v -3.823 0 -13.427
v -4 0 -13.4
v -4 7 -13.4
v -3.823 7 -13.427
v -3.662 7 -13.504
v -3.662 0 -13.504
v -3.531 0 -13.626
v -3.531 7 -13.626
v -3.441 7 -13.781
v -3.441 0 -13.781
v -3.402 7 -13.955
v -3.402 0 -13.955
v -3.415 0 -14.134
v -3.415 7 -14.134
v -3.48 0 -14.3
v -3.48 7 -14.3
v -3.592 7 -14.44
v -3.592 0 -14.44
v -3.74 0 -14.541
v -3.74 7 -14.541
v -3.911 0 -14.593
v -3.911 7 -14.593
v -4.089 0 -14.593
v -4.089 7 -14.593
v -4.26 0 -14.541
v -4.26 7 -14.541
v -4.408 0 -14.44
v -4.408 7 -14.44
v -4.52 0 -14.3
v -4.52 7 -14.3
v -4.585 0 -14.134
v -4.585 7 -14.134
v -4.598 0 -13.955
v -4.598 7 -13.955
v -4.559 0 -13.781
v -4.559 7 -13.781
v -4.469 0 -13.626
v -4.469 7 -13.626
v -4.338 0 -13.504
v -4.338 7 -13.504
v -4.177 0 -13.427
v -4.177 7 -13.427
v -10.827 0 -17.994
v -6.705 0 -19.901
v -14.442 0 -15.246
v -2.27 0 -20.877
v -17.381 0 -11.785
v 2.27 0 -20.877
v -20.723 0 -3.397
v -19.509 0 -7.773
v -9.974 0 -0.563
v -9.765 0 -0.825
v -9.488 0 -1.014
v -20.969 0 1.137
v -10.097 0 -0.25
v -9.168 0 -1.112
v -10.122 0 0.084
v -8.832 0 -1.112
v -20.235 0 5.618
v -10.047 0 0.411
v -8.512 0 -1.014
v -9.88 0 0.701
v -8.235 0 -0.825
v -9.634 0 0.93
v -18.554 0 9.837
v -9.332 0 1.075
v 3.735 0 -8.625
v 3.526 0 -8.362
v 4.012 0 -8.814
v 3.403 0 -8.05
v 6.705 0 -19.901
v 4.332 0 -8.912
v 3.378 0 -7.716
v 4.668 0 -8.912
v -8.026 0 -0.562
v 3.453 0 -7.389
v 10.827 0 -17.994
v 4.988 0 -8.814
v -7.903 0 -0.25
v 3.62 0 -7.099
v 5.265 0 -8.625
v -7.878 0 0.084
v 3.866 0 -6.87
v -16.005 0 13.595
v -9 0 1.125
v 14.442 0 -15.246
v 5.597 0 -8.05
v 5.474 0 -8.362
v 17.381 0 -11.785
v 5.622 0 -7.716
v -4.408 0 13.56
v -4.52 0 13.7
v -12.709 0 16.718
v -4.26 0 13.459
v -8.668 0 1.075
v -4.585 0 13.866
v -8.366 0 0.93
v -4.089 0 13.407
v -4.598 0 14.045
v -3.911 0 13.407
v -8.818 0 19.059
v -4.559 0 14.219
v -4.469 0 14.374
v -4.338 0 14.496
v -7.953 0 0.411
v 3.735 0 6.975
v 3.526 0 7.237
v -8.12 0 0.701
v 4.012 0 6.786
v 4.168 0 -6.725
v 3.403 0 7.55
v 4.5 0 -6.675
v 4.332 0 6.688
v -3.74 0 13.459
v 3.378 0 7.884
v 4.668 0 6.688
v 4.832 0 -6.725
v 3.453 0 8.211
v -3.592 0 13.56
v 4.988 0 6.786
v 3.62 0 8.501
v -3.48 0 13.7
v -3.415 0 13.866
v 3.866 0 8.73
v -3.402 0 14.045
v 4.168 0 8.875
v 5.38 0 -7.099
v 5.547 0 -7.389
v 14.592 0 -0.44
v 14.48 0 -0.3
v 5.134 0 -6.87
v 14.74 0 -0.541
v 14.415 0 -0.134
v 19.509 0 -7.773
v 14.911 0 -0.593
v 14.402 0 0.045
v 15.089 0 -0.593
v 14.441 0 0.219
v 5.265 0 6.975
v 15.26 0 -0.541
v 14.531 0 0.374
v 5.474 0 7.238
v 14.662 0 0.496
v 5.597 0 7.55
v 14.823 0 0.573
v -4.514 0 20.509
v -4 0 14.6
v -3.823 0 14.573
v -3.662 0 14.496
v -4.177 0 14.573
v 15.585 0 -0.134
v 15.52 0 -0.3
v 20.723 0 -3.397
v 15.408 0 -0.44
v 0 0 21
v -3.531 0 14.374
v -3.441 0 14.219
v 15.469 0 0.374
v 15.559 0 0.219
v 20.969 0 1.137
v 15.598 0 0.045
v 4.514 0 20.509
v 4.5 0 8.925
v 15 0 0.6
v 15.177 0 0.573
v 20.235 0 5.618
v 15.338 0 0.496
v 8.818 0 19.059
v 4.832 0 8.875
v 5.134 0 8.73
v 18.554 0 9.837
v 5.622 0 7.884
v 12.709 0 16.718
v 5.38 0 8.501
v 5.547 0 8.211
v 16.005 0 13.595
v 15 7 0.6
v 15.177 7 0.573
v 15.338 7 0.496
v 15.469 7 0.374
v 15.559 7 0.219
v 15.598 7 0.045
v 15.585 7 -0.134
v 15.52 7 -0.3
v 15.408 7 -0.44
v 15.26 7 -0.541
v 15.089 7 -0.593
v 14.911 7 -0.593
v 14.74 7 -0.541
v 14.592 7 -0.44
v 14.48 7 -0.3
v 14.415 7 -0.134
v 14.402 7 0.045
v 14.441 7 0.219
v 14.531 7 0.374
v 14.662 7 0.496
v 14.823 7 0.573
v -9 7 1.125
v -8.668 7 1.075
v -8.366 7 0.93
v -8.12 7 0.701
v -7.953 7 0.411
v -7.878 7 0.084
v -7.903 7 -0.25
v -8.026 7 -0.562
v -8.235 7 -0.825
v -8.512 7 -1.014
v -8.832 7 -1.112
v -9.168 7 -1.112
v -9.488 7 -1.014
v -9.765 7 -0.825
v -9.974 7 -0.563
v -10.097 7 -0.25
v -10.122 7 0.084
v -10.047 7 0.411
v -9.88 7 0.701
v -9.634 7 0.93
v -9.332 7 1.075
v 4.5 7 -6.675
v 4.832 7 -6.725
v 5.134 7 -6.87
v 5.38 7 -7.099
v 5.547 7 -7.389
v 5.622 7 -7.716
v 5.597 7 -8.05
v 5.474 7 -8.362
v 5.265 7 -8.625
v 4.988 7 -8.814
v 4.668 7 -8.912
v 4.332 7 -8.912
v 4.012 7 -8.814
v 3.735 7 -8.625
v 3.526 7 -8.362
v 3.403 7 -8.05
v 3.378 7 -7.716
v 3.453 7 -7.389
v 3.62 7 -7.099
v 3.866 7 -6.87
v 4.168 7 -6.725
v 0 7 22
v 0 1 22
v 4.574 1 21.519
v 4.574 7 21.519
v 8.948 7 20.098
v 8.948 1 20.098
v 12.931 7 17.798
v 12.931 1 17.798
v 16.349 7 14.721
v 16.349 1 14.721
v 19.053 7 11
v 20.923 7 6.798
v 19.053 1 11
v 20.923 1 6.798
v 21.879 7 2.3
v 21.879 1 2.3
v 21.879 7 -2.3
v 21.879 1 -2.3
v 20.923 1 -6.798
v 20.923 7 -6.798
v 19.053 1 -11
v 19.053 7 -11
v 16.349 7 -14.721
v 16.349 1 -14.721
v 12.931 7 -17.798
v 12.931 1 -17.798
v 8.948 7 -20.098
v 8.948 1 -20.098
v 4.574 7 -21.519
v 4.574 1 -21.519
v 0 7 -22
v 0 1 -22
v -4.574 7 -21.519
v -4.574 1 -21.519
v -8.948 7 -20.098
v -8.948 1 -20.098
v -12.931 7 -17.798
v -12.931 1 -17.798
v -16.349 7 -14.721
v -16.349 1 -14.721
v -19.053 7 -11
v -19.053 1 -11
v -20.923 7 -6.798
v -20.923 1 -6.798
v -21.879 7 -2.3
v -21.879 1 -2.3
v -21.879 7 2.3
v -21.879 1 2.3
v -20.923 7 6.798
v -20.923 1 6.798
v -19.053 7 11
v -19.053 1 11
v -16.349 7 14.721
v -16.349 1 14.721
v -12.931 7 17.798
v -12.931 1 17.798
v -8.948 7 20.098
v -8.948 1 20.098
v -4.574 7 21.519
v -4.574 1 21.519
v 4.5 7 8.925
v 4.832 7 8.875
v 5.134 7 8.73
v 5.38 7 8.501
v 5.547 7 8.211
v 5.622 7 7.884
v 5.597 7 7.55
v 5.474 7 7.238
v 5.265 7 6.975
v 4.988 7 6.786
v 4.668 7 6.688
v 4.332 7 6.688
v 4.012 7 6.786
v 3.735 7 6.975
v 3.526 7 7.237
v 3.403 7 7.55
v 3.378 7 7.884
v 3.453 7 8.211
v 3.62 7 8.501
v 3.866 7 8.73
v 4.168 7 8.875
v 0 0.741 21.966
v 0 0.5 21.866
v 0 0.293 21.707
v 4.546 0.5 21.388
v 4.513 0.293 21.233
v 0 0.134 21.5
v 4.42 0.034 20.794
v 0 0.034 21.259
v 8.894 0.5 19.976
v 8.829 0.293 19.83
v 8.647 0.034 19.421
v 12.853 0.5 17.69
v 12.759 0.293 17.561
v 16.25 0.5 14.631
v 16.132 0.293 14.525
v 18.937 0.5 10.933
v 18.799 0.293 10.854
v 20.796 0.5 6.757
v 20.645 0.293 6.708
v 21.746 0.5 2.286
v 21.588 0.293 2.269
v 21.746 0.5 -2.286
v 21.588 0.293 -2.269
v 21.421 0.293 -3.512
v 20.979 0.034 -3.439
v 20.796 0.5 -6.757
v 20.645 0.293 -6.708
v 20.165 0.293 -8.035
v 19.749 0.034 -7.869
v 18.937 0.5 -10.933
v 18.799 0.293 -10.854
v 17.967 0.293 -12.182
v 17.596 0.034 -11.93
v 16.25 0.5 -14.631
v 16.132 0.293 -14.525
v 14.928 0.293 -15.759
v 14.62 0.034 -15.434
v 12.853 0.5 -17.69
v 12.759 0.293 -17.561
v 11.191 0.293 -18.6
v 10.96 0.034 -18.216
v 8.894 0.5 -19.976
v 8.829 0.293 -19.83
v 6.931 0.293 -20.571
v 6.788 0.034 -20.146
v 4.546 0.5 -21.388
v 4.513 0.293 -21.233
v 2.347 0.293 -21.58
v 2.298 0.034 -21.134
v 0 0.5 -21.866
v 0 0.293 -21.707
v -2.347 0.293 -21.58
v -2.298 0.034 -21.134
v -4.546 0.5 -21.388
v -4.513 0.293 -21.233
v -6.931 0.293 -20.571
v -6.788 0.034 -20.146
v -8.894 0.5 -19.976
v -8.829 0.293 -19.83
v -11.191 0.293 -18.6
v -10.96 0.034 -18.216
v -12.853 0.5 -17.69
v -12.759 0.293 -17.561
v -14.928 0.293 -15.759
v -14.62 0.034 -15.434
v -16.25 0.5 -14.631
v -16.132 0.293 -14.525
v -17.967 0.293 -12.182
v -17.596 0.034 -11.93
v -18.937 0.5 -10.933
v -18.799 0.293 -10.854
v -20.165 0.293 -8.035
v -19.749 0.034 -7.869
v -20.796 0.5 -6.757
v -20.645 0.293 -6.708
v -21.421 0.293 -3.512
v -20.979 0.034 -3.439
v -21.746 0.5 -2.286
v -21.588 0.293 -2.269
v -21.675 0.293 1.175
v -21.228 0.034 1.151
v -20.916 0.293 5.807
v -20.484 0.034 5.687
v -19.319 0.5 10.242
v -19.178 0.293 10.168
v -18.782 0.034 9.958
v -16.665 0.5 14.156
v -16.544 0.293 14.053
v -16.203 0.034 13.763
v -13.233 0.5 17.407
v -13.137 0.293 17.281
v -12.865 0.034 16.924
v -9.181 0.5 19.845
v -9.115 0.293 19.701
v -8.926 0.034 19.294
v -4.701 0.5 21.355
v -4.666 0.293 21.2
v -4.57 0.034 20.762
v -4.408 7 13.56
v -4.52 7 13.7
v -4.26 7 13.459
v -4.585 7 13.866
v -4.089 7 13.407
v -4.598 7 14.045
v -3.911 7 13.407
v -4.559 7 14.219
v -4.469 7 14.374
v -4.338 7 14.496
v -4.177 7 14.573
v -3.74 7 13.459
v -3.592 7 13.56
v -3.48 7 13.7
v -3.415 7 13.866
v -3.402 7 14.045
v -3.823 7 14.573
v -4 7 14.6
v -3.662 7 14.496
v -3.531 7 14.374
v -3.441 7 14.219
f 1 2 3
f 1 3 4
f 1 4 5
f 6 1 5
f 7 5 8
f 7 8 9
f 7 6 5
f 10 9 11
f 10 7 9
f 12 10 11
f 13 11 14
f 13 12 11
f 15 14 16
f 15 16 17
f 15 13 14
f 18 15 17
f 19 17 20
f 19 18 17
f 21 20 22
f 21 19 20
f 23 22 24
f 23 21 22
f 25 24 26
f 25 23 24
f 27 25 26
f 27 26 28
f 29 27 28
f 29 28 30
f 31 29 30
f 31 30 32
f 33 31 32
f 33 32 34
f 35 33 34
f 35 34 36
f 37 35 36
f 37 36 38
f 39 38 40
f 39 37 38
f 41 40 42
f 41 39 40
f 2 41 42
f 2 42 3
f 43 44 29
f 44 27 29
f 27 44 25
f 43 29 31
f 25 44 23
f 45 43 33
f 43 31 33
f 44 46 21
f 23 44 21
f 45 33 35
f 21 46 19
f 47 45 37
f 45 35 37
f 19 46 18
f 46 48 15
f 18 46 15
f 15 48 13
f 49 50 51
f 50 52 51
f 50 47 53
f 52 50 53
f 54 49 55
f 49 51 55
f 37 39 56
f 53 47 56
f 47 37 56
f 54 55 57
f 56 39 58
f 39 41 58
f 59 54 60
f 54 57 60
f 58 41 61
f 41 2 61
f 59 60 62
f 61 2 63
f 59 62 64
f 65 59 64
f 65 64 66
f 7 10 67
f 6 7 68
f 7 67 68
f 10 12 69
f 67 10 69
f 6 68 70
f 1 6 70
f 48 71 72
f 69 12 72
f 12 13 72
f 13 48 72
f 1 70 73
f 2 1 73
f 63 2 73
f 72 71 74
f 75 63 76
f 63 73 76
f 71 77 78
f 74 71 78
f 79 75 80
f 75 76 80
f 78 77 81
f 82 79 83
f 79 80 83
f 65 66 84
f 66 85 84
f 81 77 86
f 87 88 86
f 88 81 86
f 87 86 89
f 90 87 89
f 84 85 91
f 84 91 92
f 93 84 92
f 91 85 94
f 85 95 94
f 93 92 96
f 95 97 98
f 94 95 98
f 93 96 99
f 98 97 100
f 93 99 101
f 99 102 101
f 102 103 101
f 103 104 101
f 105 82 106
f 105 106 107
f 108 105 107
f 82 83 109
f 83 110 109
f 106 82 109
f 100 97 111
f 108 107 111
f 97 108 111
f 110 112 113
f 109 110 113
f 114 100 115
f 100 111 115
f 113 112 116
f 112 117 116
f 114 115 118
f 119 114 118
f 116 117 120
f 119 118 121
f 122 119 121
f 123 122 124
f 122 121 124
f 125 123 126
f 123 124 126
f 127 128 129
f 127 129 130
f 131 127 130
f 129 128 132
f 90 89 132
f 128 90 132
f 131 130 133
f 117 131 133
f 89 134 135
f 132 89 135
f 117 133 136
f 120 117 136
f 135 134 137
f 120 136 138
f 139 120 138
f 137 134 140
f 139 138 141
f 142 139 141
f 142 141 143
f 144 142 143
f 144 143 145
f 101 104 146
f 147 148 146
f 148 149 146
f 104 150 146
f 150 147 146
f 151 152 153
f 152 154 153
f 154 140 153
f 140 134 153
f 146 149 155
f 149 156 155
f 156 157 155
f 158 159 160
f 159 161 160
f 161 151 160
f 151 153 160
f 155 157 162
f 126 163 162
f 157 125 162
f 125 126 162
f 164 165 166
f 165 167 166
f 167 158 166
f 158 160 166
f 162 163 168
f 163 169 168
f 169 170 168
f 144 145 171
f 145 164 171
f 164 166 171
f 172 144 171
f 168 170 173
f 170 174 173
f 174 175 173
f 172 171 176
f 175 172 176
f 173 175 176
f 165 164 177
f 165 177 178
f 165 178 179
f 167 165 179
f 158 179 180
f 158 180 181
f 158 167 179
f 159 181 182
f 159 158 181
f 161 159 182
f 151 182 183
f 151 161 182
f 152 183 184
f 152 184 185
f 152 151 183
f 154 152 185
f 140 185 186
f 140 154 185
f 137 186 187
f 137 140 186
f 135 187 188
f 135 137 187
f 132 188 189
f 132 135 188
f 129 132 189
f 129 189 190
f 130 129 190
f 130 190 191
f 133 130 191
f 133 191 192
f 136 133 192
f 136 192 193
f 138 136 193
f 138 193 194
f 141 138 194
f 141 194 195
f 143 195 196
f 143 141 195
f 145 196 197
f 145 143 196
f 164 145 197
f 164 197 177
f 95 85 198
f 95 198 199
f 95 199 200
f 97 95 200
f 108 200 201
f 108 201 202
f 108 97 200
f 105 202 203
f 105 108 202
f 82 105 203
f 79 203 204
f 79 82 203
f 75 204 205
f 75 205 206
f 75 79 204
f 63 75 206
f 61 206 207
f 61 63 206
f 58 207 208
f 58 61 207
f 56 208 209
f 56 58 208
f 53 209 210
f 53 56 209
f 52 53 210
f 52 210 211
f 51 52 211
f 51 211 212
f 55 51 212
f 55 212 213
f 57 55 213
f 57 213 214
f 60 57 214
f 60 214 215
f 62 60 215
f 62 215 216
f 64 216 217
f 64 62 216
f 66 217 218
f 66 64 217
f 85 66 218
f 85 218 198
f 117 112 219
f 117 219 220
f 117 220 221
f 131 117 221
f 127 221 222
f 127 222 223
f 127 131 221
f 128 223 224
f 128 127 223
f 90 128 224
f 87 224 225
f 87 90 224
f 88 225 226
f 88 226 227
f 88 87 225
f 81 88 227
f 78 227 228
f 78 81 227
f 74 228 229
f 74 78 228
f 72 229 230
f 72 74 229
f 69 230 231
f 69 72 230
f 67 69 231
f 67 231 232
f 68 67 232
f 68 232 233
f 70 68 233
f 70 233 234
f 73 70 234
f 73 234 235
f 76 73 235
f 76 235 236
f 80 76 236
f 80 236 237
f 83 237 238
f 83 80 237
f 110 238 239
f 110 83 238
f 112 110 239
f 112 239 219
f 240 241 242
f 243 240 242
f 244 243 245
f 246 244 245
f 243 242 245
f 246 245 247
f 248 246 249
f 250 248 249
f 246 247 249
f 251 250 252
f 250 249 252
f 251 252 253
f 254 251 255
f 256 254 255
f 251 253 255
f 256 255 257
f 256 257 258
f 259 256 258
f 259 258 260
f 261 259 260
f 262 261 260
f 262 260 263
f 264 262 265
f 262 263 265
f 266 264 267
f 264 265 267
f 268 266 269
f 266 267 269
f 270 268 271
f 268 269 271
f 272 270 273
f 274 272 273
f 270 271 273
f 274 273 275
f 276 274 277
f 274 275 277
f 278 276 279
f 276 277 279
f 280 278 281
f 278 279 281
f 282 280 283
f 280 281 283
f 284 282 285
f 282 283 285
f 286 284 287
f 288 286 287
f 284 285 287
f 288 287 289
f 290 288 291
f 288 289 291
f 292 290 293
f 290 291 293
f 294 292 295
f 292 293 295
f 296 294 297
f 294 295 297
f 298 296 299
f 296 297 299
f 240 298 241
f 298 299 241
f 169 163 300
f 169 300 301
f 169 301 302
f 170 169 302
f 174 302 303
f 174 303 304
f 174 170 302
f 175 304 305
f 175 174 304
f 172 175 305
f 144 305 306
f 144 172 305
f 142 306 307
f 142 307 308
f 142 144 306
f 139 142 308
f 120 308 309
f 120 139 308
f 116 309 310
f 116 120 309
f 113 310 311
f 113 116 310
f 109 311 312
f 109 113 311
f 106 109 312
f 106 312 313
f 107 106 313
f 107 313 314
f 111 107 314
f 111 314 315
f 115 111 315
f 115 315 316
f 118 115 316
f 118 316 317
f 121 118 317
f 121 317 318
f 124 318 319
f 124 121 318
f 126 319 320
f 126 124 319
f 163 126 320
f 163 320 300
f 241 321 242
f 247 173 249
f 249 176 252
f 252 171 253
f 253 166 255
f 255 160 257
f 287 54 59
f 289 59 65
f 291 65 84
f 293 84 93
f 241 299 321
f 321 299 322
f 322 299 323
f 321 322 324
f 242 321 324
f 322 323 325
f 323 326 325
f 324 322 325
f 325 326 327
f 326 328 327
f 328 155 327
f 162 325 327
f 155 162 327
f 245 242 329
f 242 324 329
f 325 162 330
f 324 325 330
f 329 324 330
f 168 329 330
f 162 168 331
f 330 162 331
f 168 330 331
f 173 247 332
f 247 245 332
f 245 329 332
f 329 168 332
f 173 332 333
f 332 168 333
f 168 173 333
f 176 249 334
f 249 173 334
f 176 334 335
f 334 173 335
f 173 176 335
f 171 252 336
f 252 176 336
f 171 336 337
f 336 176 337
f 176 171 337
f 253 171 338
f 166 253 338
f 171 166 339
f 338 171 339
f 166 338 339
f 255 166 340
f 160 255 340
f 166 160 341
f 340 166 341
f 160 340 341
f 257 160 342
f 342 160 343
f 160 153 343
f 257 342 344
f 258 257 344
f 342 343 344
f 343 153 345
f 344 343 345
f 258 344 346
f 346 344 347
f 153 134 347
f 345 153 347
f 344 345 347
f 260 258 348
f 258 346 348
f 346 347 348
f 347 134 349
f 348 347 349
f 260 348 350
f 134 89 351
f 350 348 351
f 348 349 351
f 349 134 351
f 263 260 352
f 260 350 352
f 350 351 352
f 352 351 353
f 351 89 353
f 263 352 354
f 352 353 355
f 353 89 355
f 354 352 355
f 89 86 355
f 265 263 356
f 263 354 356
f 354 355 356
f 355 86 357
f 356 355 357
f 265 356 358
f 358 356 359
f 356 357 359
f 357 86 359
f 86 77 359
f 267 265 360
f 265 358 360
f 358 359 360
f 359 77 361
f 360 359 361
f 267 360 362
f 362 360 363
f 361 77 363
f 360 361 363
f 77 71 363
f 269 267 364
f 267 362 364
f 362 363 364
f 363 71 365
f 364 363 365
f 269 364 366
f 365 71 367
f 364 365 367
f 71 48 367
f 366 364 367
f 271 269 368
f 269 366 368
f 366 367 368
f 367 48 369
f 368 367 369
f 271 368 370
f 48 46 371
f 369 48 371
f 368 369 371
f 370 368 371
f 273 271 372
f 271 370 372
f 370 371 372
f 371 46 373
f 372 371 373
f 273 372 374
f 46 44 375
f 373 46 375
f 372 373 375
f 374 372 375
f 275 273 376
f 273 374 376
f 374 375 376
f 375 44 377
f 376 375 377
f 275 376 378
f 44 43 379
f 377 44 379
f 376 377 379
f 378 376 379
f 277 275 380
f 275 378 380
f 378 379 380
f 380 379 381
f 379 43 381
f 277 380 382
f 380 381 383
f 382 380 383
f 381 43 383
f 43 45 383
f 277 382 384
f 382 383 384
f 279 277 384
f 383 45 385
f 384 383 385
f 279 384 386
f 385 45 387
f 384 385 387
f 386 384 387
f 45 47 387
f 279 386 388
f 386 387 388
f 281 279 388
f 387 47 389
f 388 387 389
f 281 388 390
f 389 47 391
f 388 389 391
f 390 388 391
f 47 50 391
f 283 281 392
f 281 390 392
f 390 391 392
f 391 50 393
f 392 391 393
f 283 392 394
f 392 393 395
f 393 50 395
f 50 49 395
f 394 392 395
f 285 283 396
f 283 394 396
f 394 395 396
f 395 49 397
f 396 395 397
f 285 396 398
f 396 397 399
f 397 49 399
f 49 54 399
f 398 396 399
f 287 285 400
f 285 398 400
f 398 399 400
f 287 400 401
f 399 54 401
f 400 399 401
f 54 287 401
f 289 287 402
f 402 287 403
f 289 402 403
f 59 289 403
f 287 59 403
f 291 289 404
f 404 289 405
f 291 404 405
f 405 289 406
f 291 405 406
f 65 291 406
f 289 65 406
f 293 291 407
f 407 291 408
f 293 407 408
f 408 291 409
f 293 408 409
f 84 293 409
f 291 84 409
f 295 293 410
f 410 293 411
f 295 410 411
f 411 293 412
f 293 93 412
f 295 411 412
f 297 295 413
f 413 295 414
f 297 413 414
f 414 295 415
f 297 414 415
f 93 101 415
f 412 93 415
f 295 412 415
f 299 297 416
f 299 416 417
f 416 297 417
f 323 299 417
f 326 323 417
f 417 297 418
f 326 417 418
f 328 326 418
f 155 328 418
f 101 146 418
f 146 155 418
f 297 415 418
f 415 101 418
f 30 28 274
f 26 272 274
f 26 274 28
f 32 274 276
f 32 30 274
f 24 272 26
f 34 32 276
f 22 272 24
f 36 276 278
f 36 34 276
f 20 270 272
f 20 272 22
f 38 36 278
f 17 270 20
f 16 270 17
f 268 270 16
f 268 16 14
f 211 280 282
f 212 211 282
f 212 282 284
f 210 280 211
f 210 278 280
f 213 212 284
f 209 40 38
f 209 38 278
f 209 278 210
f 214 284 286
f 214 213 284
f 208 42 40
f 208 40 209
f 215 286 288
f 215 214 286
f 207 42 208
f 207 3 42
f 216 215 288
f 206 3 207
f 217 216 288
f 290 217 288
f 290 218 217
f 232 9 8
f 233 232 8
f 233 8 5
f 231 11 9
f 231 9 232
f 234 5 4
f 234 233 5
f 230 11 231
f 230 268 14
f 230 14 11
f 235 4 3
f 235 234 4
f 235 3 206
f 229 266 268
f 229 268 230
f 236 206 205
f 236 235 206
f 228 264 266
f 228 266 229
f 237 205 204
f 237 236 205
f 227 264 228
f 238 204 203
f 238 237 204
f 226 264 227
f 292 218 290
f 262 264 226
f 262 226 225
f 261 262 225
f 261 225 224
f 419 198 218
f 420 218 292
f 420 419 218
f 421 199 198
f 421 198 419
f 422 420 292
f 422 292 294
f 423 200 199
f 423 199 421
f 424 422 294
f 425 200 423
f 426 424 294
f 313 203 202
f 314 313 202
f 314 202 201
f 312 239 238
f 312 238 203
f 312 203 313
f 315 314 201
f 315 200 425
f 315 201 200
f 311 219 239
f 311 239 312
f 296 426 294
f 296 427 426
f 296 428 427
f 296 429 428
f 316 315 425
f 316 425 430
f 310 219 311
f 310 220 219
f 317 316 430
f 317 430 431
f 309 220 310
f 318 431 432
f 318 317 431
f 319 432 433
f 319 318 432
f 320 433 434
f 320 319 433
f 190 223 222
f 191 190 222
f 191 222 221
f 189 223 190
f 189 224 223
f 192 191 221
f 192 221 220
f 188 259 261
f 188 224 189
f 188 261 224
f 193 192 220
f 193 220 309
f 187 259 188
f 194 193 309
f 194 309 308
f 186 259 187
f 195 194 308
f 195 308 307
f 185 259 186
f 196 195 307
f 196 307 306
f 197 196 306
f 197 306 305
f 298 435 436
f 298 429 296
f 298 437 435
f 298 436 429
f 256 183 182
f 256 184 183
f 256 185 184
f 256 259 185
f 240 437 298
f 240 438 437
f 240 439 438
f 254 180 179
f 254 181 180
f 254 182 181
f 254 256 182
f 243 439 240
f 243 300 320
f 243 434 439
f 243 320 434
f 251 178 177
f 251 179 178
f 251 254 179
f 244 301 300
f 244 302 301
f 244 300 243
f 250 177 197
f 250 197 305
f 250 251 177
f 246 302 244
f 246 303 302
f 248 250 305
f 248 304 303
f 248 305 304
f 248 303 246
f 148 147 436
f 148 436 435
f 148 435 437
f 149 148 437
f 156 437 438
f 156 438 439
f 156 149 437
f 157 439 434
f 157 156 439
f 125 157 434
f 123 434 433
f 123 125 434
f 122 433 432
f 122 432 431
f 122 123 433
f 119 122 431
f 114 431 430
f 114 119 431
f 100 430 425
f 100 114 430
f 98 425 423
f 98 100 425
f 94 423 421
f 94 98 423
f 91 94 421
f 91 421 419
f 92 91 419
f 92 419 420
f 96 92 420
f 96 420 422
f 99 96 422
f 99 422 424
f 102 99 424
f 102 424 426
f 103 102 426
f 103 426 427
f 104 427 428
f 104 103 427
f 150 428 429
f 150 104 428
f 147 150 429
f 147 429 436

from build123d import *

# Parameters (mm, degrees)
SKETCH1_R           = 22
SKETCH1_R_2         = 0.6
SKETCH1_R_3         = 1.125
BOSS_EXTRUDE1_DEPTH = 7
FILLET1_R           = 1


with BuildPart() as part:
    # Sketch1 → Boss-Extrude1 (new body)
    with BuildSketch(Plane(origin=(0, 0, 0), x_dir=(1, 0, 0), z_dir=(0, 1, 0))):
        with Locations(Location((0, 0, 0), (0, 0, 270))):
            Circle(SKETCH1_R)
        with Locations(Location((-4, 14, 0), (0, 0, 270))):
            Circle(SKETCH1_R_2, mode=Mode.SUBTRACT)
        with Locations(Location((-4, -14, 0), (0, 0, 270))):
            Circle(SKETCH1_R_2, mode=Mode.SUBTRACT)
        with Locations(Location((15, 0, 0), (0, 0, 270))):
            Circle(SKETCH1_R_2, mode=Mode.SUBTRACT)
        with Locations(Location((-9, 0, 0), (0, 0, 270))):
            Circle(SKETCH1_R_3, mode=Mode.SUBTRACT)
        with Locations(Location((4.5, 7.8, 0), (0, 0, 270))):
            Circle(SKETCH1_R_3, mode=Mode.SUBTRACT)
        with Locations(Location((4.5, -7.8, 0), (0, 0, 270))):
            Circle(SKETCH1_R_3, mode=Mode.SUBTRACT)
    extrude(amount=BOSS_EXTRUDE1_DEPTH)

    # Fillet1
    fillet1_edges = [part.edges().sort_by_distance(p)[0] for p in [
        (0, 0, -22),
    ]]
    fillet(fillet1_edges, radius=FILLET1_R)


solid = part.part
